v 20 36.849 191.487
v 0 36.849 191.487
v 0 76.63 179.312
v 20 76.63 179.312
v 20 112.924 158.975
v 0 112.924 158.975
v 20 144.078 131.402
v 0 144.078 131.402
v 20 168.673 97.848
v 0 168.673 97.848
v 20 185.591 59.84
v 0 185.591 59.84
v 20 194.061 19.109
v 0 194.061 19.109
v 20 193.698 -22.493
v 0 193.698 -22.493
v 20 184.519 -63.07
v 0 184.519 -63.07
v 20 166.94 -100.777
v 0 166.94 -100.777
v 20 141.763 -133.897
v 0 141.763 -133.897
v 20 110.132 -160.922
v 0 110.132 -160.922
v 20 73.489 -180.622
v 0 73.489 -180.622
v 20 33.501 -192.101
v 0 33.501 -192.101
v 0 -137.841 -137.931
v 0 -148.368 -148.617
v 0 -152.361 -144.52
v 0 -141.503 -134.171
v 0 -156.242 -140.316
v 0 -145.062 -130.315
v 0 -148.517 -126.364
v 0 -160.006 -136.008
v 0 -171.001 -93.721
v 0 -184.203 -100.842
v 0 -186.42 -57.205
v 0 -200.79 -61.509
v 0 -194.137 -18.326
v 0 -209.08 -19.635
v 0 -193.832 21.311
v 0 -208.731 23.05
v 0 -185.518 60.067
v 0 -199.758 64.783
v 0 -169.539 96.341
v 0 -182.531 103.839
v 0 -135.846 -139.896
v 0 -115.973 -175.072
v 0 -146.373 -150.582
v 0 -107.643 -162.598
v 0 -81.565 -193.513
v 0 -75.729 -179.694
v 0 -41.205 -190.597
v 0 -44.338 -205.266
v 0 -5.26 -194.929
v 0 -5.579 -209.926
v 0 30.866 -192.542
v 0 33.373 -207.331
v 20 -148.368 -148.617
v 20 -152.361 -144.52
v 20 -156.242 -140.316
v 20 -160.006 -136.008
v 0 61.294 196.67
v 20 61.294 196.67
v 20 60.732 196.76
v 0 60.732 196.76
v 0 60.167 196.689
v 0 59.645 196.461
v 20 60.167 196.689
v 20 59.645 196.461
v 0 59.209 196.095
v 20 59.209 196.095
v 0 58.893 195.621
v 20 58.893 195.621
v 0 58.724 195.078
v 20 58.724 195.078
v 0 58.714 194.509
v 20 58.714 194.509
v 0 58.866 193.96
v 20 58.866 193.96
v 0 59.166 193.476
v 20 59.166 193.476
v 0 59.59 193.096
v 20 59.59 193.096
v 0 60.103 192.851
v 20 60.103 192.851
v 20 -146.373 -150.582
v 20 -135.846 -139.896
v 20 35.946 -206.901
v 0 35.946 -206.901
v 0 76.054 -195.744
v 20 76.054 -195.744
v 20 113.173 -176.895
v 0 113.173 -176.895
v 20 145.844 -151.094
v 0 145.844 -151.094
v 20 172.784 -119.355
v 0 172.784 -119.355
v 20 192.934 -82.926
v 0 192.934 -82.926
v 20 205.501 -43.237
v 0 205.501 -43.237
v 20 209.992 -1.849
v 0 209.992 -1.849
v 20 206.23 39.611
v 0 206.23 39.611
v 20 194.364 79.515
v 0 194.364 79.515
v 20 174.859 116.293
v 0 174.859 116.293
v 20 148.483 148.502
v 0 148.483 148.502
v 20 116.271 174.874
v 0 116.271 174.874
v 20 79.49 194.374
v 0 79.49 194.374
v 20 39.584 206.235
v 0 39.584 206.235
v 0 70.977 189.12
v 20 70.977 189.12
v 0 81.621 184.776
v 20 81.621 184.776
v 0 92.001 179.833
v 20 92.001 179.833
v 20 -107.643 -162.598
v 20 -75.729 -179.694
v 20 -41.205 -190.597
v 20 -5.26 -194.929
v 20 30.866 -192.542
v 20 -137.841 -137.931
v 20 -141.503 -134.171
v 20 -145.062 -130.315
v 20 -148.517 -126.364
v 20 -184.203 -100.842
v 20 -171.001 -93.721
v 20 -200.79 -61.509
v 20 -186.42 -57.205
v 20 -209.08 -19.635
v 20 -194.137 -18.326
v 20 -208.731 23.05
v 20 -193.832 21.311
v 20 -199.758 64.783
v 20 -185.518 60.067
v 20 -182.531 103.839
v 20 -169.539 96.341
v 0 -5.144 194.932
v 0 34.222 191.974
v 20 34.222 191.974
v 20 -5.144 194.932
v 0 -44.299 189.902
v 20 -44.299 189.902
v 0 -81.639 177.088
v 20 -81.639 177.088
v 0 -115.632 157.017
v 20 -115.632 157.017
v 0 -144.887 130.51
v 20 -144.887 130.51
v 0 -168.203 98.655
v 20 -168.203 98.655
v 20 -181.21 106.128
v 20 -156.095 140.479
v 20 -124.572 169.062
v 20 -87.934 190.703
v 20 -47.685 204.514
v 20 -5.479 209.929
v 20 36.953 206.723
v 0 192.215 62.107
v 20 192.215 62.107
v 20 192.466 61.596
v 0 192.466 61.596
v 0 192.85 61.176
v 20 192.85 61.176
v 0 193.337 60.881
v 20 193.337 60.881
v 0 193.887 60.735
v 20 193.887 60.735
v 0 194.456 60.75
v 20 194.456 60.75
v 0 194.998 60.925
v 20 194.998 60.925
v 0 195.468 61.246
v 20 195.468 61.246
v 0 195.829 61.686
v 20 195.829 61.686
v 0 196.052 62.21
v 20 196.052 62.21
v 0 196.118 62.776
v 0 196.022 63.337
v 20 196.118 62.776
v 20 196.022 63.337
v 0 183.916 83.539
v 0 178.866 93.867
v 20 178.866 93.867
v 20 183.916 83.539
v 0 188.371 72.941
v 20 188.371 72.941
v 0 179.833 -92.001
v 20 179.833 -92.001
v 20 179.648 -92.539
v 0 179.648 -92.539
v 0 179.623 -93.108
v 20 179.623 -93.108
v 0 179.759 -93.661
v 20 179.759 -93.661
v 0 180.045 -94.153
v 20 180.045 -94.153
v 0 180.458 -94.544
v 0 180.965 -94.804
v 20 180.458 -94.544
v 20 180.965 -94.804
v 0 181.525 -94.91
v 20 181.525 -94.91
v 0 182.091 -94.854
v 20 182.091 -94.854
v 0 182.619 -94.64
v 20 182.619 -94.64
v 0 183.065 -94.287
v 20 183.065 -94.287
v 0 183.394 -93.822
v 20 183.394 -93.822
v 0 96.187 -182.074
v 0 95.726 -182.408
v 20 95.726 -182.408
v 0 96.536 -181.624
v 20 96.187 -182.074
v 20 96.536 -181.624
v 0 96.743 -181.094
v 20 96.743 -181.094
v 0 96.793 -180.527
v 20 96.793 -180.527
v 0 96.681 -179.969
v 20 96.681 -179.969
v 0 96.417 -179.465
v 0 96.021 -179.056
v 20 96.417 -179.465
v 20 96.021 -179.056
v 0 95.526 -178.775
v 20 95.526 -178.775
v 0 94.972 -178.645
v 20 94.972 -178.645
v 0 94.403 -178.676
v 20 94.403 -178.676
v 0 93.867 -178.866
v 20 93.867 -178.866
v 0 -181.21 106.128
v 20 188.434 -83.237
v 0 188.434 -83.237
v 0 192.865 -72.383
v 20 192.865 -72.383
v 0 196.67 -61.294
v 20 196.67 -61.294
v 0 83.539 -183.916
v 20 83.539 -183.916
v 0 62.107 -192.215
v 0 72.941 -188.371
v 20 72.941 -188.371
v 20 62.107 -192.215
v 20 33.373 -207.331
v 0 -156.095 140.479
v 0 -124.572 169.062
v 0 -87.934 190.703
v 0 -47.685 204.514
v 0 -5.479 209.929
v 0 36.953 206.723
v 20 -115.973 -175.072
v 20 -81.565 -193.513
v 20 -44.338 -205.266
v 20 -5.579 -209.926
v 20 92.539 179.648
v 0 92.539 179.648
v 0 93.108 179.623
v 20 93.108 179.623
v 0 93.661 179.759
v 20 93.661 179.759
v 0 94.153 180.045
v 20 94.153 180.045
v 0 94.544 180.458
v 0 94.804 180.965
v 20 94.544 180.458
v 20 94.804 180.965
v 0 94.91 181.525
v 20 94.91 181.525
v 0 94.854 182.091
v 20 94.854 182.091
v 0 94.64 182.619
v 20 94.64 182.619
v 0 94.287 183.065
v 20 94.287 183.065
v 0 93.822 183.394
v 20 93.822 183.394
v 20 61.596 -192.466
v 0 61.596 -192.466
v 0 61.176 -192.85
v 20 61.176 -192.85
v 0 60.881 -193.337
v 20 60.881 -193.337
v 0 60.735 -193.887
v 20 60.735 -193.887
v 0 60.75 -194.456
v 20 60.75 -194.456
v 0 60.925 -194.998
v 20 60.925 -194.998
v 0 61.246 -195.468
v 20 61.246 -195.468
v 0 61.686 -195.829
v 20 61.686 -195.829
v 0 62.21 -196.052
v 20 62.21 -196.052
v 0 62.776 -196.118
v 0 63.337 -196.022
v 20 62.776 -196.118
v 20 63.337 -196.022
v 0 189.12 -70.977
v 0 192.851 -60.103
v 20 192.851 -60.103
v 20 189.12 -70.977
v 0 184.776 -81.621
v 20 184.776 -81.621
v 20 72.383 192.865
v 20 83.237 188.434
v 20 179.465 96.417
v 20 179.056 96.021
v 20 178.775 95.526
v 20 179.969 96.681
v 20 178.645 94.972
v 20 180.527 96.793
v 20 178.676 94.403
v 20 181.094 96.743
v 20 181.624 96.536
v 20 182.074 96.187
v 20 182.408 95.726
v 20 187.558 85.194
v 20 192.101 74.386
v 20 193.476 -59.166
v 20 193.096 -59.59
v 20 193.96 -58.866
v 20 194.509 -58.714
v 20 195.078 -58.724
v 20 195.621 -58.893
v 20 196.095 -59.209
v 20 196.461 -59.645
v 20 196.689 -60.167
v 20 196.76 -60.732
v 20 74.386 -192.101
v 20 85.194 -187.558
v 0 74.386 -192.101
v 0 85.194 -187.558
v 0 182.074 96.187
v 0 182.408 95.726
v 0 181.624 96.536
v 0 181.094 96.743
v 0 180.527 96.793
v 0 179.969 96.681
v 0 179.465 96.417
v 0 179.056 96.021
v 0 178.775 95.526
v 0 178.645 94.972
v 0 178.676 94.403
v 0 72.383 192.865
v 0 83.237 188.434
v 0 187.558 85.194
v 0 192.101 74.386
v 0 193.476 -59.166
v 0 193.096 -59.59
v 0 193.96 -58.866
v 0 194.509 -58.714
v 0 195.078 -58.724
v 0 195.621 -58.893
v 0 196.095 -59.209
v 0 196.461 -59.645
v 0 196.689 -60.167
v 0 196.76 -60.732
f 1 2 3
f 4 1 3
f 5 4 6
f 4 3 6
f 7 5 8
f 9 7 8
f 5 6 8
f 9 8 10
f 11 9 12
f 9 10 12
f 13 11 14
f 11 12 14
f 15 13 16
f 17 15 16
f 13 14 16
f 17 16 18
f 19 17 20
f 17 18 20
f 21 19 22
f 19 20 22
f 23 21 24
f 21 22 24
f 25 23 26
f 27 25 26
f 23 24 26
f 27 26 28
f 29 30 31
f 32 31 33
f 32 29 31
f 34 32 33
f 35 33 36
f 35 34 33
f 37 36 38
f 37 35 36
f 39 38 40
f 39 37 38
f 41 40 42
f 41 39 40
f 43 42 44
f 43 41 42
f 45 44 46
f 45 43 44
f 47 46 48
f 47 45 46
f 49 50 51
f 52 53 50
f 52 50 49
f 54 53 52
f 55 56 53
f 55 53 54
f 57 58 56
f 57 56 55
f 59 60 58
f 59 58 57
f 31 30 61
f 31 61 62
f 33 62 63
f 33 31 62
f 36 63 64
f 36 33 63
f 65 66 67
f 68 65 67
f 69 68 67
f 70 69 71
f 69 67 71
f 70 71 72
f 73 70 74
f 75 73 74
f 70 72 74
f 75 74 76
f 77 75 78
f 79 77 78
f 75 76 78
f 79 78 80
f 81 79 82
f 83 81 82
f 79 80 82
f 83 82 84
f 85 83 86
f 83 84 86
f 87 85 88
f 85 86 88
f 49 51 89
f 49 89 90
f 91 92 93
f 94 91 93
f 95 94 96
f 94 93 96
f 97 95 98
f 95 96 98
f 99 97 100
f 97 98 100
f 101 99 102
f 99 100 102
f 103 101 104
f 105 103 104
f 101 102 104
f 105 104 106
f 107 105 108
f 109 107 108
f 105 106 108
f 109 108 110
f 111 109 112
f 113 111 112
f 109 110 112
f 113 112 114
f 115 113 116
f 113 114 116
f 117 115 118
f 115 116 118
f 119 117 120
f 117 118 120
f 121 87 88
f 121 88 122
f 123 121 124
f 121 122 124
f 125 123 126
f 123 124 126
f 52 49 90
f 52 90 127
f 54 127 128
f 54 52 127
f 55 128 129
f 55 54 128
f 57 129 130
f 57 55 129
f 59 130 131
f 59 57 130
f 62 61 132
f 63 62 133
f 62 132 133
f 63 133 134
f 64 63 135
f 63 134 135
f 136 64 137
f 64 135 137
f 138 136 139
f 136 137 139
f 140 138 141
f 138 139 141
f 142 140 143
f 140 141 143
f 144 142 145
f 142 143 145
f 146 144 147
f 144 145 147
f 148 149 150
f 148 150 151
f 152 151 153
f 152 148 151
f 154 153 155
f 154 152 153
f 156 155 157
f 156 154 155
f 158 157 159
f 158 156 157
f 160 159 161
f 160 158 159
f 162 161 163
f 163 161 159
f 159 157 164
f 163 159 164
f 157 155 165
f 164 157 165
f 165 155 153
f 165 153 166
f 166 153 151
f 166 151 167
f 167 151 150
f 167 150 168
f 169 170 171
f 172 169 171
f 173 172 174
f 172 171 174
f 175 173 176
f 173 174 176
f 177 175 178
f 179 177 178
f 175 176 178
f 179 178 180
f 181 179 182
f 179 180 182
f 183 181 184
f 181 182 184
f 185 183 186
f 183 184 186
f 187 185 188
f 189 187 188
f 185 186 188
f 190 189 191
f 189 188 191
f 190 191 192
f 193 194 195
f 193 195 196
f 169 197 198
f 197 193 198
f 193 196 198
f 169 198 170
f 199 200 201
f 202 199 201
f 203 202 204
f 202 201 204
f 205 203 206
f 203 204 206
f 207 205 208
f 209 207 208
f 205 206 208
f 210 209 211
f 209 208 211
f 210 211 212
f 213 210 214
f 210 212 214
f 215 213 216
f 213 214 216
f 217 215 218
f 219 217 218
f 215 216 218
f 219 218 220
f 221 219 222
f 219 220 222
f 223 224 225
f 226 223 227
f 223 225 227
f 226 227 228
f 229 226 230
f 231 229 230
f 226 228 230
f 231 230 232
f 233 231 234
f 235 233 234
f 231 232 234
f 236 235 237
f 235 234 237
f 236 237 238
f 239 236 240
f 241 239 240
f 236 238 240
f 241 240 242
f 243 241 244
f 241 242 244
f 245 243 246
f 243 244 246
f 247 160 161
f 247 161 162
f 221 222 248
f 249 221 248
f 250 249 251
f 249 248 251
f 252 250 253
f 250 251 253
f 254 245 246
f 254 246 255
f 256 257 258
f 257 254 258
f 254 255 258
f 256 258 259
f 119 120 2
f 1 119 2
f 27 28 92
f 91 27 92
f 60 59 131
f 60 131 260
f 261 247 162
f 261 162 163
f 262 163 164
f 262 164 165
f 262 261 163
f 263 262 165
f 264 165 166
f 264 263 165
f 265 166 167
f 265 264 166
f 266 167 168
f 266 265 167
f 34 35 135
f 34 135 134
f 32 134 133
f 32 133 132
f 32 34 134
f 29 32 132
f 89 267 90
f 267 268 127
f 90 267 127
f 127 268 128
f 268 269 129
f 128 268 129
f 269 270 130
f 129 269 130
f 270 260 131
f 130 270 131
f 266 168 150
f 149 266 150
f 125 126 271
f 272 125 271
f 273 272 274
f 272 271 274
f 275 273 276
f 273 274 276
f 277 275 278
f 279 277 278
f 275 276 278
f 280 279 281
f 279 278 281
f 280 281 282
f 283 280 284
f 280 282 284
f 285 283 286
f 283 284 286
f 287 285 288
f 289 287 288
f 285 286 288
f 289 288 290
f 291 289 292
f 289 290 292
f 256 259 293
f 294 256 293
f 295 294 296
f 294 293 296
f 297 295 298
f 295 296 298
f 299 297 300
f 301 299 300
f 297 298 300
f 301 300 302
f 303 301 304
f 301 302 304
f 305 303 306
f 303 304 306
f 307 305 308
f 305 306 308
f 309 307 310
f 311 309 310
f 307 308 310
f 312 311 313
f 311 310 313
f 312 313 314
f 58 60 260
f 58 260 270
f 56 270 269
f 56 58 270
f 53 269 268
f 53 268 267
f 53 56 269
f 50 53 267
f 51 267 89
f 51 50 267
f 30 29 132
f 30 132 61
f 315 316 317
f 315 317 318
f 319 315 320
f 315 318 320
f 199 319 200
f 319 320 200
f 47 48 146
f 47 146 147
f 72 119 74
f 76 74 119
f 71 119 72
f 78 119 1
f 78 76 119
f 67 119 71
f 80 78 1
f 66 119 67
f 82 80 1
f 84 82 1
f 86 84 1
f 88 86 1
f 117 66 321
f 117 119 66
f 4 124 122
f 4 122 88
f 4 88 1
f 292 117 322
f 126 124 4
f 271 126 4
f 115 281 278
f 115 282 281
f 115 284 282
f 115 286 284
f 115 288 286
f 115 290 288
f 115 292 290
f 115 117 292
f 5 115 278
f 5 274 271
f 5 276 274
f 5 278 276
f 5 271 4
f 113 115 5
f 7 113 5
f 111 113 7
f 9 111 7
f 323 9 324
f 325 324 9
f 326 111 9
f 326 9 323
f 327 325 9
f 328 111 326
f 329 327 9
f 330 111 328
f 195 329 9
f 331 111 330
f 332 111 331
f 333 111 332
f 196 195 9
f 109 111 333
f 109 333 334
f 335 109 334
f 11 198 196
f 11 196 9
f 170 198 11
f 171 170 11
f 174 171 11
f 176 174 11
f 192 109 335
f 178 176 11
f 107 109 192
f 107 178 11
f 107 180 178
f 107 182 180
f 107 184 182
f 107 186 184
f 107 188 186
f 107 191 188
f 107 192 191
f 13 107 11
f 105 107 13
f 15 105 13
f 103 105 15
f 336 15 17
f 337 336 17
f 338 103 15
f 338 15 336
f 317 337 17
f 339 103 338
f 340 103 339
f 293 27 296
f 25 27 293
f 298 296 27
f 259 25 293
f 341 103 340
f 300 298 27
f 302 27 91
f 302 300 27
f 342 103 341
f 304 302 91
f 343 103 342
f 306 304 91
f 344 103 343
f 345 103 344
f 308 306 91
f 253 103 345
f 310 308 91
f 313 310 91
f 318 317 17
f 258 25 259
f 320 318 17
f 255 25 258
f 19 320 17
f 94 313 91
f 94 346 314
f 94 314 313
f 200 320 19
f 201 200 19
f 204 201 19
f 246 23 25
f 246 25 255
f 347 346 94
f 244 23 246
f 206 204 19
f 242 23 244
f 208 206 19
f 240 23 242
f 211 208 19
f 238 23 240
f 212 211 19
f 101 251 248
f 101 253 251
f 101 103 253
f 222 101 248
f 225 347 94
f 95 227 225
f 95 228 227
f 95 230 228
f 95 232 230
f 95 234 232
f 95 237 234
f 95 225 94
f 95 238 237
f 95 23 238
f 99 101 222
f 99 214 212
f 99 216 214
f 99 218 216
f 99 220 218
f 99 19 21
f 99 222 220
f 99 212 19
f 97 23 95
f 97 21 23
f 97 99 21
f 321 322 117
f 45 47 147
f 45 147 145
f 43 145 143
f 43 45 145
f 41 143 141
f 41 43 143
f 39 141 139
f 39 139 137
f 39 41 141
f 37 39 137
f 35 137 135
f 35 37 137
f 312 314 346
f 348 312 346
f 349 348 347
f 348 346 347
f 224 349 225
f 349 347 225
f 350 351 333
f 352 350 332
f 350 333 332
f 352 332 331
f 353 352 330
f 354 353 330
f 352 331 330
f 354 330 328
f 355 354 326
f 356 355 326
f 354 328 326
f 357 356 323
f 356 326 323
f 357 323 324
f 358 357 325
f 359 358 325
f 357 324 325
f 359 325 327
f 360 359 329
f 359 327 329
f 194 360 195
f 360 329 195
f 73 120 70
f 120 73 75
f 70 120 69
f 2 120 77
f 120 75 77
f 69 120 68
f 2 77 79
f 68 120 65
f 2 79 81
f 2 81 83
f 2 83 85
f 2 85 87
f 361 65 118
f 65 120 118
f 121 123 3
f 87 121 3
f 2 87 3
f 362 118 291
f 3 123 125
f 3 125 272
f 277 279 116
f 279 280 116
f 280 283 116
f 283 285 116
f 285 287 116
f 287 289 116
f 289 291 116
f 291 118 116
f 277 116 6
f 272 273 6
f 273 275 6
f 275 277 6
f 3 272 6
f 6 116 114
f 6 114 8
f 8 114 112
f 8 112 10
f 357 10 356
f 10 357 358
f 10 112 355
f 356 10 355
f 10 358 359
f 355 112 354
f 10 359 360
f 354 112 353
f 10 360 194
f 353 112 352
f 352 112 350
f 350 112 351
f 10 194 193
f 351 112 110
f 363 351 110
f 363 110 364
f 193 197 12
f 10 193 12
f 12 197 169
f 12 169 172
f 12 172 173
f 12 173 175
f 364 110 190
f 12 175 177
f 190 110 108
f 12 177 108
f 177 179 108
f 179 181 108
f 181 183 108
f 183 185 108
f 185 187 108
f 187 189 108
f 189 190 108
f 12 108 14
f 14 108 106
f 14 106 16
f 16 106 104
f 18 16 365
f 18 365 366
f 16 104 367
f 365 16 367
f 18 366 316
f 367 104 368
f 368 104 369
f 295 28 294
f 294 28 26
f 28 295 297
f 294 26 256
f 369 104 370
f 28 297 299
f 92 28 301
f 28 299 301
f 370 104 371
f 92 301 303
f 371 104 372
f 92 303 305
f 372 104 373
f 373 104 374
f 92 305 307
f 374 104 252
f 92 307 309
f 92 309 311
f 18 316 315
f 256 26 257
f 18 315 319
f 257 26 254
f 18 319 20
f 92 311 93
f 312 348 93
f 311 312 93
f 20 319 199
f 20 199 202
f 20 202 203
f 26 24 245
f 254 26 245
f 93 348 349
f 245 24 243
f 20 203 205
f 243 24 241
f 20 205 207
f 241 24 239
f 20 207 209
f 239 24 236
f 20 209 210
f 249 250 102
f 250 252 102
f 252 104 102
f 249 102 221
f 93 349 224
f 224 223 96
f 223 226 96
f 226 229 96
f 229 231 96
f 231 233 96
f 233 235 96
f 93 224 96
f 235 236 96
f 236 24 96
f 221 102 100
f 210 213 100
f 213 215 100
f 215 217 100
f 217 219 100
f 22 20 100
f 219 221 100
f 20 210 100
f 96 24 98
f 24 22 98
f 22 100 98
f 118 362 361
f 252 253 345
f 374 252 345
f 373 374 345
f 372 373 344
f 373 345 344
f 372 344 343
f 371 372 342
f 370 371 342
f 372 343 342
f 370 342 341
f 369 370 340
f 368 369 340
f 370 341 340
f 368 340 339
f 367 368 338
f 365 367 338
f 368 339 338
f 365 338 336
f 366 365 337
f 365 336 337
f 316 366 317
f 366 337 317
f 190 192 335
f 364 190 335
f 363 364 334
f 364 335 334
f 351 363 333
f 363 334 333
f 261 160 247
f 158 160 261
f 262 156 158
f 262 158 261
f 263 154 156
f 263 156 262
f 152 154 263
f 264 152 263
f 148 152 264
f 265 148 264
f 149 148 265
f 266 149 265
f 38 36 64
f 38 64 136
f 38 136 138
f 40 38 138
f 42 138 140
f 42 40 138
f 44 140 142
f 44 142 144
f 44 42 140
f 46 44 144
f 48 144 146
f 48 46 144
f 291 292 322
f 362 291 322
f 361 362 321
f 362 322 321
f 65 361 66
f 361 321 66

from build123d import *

# Parameters (mm, degrees)
BOSS_EXTRUDE1_DEPTH   = 20
BOSS_EXTRUDE1_2_DEPTH = 20
BOSS_EXTRUDE1_3_DEPTH = 20
BOSS_EXTRUDE1_4_DEPTH = 20
CUT_EXTRUDE1_DEPTH    = 31


with BuildPart() as part:
    # Sketch1 → Boss-Extrude1 (new body)
    with BuildSketch(Plane(origin=(0, 0, 0), x_dir=(0, 0, -1), z_dir=(1, 0, 0))):
        with BuildLine():
            Line((137.930678518, -137.840951548), (148.616838181, -148.36790559))
            ThreePointArc((148.616838181, -148.36790559), (142.431229175, -154.315731394), (136.007787822, -160.005880054))
            ThreePointArc((136.007787822, -160.005880054), (19.635454957, -209.080005999), (-103.838941685, -182.530748615))
            Line((-103.838941685, -182.530748615), (-96.340855434, -169.538902834))
            ThreePointArc((-96.340855434, -169.538902834), (18.325711034, -194.136983378), (126.363942746, -148.516510778))
            ThreePointArc((126.363942746, -148.516510778), (132.255070219, -143.295486326), (137.930678518, -137.840951548))
        make_face()
    extrude(amount=BOSS_EXTRUDE1_DEPTH)


with BuildPart() as body_2:
    # Sketch1 → Boss-Extrude1 2 (new body)
    with BuildSketch(Plane(origin=(0, 0, 0), x_dir=(0, 0, -1), z_dir=(1, 0, 0))):
        with BuildLine():
            Line((192.54165397, 30.86602479), (207.331289652, 33.372688401))
            ThreePointArc((207.331289652, 33.372688401), (200.256324225, -63.225031498), (150.581822575, -146.373203524))
            Line((150.581822575, -146.373203524), (139.895662912, -135.846249482))
            ThreePointArc((139.895662912, -135.846249482), (185.948616591, -58.720626595), (192.54165397, 30.86602479))
        make_face()
    extrude(amount=BOSS_EXTRUDE1_2_DEPTH)


with BuildPart() as body_3:
    # Sketch1 → Boss-Extrude1 3 (new body)
    with BuildSketch(Plane(origin=(0, 0, 0), x_dir=(0, 0, -1), z_dir=(1, 0, 0))):
        with BuildLine():
            Line((192.100705132, 33.501031145), (206.900670241, 35.945968532))
            ThreePointArc((206.900670241, 35.945968532), (1.849413133, 209.991856202), (-206.23546817, 39.584487729))
            Line((-206.23546817, 39.584487729), (-191.486773652, 36.848548359))
            ThreePointArc((-191.486773652, 36.848548359), (1.701674422, 194.992574998), (192.100705132, 33.501031145))
        make_face()
    extrude(amount=BOSS_EXTRUDE1_3_DEPTH)

    # Sketch6 → Cut-Extrude1 (cut, through all)
    with BuildSketch(Plane(origin=(30, 0, 0), x_dir=(0, 0, -1), z_dir=(1, 0, 0))):
        with BuildLine():
            ThreePointArc((-183.393976095, 93.822436187), (-190.726748281, 77.841553749), (-196.670022661, 61.293573779))
            ThreePointArc((-196.670022661, 61.293573779), (-195.355688205, 58.789072843), (-192.851187269, 60.103407298))
            ThreePointArc((-192.851187269, 60.103407298), (-187.023316276, 76.330067268), (-179.832928016, 92.000641309))
            ThreePointArc((-179.832928016, 92.000641309), (-180.702554617, 94.692062788), (-183.393976095, 93.822436187))
        make_face()
        with BuildLine():
            ThreePointArc((-63.336643271, 196.021604981), (-79.821886549, 189.906467577), (-95.725605017, 182.407808342))
            ThreePointArc((-95.725605017, 182.407808342), (-96.567179806, 179.707483941), (-93.866855405, 178.865909151))
            ThreePointArc((-93.866855405, 178.865909151), (-78.271947005, 186.218963353), (-62.106805537, 192.215360224))
            ThreePointArc((-62.106805537, 192.215360224), (-60.818602025, 194.733401469), (-63.336643271, 196.021604981))
        make_face()
        with BuildLine():
            ThreePointArc((93.822436187, 183.393976095), (77.841553749, 190.726748281), (61.293573779, 196.670022661))
            ThreePointArc((61.293573779, 196.670022661), (58.789072843, 195.355688205), (60.103407298, 192.851187269))
            ThreePointArc((60.103407298, 192.851187269), (76.330067268, 187.023316276), (92.000641309, 179.832928016))
            ThreePointArc((92.000641309, 179.832928016), (94.692062788, 180.702554617), (93.822436187, 183.393976095))
        make_face()
        with BuildLine():
            ThreePointArc((196.021604981, 63.336643271), (189.906467577, 79.821886549), (182.407808342, 95.725605017))
            ThreePointArc((182.407808342, 95.725605017), (179.707483941, 96.567179806), (178.865909151, 93.866855405))
            ThreePointArc((178.865909151, 93.866855405), (186.218963353, 78.271947005), (192.215360224, 62.106805537))
            ThreePointArc((192.215360224, 62.106805537), (194.733401469, 60.818602025), (196.021604981, 63.336643271))
        make_face()
    extrude(amount=-CUT_EXTRUDE1_DEPTH, mode=Mode.SUBTRACT)


with BuildPart() as body_4:
    # Sketch1 → Boss-Extrude1 4 (new body)
    with BuildSketch(Plane(origin=(0, 0, 0), x_dir=(0, 0, -1), z_dir=(1, 0, 0))):
        with BuildLine():
            Line((-98.654569067, -168.203079645), (-106.127730946, -181.209560245))
            ThreePointArc((-106.127730946, -181.209560245), (-190.703015105, -87.933838935), (-206.723208034, 36.952878914))
            Line((-206.723208034, 36.952878914), (-191.973642534, 34.221638946))
            ThreePointArc((-191.973642534, 34.221638946), (-177.087918896, -81.63864882), (-98.654569067, -168.203079645))
        make_face()
    extrude(amount=BOSS_EXTRUDE1_4_DEPTH)


solid = Compound([part.part, body_2.part, body_3.part, body_4.part])
